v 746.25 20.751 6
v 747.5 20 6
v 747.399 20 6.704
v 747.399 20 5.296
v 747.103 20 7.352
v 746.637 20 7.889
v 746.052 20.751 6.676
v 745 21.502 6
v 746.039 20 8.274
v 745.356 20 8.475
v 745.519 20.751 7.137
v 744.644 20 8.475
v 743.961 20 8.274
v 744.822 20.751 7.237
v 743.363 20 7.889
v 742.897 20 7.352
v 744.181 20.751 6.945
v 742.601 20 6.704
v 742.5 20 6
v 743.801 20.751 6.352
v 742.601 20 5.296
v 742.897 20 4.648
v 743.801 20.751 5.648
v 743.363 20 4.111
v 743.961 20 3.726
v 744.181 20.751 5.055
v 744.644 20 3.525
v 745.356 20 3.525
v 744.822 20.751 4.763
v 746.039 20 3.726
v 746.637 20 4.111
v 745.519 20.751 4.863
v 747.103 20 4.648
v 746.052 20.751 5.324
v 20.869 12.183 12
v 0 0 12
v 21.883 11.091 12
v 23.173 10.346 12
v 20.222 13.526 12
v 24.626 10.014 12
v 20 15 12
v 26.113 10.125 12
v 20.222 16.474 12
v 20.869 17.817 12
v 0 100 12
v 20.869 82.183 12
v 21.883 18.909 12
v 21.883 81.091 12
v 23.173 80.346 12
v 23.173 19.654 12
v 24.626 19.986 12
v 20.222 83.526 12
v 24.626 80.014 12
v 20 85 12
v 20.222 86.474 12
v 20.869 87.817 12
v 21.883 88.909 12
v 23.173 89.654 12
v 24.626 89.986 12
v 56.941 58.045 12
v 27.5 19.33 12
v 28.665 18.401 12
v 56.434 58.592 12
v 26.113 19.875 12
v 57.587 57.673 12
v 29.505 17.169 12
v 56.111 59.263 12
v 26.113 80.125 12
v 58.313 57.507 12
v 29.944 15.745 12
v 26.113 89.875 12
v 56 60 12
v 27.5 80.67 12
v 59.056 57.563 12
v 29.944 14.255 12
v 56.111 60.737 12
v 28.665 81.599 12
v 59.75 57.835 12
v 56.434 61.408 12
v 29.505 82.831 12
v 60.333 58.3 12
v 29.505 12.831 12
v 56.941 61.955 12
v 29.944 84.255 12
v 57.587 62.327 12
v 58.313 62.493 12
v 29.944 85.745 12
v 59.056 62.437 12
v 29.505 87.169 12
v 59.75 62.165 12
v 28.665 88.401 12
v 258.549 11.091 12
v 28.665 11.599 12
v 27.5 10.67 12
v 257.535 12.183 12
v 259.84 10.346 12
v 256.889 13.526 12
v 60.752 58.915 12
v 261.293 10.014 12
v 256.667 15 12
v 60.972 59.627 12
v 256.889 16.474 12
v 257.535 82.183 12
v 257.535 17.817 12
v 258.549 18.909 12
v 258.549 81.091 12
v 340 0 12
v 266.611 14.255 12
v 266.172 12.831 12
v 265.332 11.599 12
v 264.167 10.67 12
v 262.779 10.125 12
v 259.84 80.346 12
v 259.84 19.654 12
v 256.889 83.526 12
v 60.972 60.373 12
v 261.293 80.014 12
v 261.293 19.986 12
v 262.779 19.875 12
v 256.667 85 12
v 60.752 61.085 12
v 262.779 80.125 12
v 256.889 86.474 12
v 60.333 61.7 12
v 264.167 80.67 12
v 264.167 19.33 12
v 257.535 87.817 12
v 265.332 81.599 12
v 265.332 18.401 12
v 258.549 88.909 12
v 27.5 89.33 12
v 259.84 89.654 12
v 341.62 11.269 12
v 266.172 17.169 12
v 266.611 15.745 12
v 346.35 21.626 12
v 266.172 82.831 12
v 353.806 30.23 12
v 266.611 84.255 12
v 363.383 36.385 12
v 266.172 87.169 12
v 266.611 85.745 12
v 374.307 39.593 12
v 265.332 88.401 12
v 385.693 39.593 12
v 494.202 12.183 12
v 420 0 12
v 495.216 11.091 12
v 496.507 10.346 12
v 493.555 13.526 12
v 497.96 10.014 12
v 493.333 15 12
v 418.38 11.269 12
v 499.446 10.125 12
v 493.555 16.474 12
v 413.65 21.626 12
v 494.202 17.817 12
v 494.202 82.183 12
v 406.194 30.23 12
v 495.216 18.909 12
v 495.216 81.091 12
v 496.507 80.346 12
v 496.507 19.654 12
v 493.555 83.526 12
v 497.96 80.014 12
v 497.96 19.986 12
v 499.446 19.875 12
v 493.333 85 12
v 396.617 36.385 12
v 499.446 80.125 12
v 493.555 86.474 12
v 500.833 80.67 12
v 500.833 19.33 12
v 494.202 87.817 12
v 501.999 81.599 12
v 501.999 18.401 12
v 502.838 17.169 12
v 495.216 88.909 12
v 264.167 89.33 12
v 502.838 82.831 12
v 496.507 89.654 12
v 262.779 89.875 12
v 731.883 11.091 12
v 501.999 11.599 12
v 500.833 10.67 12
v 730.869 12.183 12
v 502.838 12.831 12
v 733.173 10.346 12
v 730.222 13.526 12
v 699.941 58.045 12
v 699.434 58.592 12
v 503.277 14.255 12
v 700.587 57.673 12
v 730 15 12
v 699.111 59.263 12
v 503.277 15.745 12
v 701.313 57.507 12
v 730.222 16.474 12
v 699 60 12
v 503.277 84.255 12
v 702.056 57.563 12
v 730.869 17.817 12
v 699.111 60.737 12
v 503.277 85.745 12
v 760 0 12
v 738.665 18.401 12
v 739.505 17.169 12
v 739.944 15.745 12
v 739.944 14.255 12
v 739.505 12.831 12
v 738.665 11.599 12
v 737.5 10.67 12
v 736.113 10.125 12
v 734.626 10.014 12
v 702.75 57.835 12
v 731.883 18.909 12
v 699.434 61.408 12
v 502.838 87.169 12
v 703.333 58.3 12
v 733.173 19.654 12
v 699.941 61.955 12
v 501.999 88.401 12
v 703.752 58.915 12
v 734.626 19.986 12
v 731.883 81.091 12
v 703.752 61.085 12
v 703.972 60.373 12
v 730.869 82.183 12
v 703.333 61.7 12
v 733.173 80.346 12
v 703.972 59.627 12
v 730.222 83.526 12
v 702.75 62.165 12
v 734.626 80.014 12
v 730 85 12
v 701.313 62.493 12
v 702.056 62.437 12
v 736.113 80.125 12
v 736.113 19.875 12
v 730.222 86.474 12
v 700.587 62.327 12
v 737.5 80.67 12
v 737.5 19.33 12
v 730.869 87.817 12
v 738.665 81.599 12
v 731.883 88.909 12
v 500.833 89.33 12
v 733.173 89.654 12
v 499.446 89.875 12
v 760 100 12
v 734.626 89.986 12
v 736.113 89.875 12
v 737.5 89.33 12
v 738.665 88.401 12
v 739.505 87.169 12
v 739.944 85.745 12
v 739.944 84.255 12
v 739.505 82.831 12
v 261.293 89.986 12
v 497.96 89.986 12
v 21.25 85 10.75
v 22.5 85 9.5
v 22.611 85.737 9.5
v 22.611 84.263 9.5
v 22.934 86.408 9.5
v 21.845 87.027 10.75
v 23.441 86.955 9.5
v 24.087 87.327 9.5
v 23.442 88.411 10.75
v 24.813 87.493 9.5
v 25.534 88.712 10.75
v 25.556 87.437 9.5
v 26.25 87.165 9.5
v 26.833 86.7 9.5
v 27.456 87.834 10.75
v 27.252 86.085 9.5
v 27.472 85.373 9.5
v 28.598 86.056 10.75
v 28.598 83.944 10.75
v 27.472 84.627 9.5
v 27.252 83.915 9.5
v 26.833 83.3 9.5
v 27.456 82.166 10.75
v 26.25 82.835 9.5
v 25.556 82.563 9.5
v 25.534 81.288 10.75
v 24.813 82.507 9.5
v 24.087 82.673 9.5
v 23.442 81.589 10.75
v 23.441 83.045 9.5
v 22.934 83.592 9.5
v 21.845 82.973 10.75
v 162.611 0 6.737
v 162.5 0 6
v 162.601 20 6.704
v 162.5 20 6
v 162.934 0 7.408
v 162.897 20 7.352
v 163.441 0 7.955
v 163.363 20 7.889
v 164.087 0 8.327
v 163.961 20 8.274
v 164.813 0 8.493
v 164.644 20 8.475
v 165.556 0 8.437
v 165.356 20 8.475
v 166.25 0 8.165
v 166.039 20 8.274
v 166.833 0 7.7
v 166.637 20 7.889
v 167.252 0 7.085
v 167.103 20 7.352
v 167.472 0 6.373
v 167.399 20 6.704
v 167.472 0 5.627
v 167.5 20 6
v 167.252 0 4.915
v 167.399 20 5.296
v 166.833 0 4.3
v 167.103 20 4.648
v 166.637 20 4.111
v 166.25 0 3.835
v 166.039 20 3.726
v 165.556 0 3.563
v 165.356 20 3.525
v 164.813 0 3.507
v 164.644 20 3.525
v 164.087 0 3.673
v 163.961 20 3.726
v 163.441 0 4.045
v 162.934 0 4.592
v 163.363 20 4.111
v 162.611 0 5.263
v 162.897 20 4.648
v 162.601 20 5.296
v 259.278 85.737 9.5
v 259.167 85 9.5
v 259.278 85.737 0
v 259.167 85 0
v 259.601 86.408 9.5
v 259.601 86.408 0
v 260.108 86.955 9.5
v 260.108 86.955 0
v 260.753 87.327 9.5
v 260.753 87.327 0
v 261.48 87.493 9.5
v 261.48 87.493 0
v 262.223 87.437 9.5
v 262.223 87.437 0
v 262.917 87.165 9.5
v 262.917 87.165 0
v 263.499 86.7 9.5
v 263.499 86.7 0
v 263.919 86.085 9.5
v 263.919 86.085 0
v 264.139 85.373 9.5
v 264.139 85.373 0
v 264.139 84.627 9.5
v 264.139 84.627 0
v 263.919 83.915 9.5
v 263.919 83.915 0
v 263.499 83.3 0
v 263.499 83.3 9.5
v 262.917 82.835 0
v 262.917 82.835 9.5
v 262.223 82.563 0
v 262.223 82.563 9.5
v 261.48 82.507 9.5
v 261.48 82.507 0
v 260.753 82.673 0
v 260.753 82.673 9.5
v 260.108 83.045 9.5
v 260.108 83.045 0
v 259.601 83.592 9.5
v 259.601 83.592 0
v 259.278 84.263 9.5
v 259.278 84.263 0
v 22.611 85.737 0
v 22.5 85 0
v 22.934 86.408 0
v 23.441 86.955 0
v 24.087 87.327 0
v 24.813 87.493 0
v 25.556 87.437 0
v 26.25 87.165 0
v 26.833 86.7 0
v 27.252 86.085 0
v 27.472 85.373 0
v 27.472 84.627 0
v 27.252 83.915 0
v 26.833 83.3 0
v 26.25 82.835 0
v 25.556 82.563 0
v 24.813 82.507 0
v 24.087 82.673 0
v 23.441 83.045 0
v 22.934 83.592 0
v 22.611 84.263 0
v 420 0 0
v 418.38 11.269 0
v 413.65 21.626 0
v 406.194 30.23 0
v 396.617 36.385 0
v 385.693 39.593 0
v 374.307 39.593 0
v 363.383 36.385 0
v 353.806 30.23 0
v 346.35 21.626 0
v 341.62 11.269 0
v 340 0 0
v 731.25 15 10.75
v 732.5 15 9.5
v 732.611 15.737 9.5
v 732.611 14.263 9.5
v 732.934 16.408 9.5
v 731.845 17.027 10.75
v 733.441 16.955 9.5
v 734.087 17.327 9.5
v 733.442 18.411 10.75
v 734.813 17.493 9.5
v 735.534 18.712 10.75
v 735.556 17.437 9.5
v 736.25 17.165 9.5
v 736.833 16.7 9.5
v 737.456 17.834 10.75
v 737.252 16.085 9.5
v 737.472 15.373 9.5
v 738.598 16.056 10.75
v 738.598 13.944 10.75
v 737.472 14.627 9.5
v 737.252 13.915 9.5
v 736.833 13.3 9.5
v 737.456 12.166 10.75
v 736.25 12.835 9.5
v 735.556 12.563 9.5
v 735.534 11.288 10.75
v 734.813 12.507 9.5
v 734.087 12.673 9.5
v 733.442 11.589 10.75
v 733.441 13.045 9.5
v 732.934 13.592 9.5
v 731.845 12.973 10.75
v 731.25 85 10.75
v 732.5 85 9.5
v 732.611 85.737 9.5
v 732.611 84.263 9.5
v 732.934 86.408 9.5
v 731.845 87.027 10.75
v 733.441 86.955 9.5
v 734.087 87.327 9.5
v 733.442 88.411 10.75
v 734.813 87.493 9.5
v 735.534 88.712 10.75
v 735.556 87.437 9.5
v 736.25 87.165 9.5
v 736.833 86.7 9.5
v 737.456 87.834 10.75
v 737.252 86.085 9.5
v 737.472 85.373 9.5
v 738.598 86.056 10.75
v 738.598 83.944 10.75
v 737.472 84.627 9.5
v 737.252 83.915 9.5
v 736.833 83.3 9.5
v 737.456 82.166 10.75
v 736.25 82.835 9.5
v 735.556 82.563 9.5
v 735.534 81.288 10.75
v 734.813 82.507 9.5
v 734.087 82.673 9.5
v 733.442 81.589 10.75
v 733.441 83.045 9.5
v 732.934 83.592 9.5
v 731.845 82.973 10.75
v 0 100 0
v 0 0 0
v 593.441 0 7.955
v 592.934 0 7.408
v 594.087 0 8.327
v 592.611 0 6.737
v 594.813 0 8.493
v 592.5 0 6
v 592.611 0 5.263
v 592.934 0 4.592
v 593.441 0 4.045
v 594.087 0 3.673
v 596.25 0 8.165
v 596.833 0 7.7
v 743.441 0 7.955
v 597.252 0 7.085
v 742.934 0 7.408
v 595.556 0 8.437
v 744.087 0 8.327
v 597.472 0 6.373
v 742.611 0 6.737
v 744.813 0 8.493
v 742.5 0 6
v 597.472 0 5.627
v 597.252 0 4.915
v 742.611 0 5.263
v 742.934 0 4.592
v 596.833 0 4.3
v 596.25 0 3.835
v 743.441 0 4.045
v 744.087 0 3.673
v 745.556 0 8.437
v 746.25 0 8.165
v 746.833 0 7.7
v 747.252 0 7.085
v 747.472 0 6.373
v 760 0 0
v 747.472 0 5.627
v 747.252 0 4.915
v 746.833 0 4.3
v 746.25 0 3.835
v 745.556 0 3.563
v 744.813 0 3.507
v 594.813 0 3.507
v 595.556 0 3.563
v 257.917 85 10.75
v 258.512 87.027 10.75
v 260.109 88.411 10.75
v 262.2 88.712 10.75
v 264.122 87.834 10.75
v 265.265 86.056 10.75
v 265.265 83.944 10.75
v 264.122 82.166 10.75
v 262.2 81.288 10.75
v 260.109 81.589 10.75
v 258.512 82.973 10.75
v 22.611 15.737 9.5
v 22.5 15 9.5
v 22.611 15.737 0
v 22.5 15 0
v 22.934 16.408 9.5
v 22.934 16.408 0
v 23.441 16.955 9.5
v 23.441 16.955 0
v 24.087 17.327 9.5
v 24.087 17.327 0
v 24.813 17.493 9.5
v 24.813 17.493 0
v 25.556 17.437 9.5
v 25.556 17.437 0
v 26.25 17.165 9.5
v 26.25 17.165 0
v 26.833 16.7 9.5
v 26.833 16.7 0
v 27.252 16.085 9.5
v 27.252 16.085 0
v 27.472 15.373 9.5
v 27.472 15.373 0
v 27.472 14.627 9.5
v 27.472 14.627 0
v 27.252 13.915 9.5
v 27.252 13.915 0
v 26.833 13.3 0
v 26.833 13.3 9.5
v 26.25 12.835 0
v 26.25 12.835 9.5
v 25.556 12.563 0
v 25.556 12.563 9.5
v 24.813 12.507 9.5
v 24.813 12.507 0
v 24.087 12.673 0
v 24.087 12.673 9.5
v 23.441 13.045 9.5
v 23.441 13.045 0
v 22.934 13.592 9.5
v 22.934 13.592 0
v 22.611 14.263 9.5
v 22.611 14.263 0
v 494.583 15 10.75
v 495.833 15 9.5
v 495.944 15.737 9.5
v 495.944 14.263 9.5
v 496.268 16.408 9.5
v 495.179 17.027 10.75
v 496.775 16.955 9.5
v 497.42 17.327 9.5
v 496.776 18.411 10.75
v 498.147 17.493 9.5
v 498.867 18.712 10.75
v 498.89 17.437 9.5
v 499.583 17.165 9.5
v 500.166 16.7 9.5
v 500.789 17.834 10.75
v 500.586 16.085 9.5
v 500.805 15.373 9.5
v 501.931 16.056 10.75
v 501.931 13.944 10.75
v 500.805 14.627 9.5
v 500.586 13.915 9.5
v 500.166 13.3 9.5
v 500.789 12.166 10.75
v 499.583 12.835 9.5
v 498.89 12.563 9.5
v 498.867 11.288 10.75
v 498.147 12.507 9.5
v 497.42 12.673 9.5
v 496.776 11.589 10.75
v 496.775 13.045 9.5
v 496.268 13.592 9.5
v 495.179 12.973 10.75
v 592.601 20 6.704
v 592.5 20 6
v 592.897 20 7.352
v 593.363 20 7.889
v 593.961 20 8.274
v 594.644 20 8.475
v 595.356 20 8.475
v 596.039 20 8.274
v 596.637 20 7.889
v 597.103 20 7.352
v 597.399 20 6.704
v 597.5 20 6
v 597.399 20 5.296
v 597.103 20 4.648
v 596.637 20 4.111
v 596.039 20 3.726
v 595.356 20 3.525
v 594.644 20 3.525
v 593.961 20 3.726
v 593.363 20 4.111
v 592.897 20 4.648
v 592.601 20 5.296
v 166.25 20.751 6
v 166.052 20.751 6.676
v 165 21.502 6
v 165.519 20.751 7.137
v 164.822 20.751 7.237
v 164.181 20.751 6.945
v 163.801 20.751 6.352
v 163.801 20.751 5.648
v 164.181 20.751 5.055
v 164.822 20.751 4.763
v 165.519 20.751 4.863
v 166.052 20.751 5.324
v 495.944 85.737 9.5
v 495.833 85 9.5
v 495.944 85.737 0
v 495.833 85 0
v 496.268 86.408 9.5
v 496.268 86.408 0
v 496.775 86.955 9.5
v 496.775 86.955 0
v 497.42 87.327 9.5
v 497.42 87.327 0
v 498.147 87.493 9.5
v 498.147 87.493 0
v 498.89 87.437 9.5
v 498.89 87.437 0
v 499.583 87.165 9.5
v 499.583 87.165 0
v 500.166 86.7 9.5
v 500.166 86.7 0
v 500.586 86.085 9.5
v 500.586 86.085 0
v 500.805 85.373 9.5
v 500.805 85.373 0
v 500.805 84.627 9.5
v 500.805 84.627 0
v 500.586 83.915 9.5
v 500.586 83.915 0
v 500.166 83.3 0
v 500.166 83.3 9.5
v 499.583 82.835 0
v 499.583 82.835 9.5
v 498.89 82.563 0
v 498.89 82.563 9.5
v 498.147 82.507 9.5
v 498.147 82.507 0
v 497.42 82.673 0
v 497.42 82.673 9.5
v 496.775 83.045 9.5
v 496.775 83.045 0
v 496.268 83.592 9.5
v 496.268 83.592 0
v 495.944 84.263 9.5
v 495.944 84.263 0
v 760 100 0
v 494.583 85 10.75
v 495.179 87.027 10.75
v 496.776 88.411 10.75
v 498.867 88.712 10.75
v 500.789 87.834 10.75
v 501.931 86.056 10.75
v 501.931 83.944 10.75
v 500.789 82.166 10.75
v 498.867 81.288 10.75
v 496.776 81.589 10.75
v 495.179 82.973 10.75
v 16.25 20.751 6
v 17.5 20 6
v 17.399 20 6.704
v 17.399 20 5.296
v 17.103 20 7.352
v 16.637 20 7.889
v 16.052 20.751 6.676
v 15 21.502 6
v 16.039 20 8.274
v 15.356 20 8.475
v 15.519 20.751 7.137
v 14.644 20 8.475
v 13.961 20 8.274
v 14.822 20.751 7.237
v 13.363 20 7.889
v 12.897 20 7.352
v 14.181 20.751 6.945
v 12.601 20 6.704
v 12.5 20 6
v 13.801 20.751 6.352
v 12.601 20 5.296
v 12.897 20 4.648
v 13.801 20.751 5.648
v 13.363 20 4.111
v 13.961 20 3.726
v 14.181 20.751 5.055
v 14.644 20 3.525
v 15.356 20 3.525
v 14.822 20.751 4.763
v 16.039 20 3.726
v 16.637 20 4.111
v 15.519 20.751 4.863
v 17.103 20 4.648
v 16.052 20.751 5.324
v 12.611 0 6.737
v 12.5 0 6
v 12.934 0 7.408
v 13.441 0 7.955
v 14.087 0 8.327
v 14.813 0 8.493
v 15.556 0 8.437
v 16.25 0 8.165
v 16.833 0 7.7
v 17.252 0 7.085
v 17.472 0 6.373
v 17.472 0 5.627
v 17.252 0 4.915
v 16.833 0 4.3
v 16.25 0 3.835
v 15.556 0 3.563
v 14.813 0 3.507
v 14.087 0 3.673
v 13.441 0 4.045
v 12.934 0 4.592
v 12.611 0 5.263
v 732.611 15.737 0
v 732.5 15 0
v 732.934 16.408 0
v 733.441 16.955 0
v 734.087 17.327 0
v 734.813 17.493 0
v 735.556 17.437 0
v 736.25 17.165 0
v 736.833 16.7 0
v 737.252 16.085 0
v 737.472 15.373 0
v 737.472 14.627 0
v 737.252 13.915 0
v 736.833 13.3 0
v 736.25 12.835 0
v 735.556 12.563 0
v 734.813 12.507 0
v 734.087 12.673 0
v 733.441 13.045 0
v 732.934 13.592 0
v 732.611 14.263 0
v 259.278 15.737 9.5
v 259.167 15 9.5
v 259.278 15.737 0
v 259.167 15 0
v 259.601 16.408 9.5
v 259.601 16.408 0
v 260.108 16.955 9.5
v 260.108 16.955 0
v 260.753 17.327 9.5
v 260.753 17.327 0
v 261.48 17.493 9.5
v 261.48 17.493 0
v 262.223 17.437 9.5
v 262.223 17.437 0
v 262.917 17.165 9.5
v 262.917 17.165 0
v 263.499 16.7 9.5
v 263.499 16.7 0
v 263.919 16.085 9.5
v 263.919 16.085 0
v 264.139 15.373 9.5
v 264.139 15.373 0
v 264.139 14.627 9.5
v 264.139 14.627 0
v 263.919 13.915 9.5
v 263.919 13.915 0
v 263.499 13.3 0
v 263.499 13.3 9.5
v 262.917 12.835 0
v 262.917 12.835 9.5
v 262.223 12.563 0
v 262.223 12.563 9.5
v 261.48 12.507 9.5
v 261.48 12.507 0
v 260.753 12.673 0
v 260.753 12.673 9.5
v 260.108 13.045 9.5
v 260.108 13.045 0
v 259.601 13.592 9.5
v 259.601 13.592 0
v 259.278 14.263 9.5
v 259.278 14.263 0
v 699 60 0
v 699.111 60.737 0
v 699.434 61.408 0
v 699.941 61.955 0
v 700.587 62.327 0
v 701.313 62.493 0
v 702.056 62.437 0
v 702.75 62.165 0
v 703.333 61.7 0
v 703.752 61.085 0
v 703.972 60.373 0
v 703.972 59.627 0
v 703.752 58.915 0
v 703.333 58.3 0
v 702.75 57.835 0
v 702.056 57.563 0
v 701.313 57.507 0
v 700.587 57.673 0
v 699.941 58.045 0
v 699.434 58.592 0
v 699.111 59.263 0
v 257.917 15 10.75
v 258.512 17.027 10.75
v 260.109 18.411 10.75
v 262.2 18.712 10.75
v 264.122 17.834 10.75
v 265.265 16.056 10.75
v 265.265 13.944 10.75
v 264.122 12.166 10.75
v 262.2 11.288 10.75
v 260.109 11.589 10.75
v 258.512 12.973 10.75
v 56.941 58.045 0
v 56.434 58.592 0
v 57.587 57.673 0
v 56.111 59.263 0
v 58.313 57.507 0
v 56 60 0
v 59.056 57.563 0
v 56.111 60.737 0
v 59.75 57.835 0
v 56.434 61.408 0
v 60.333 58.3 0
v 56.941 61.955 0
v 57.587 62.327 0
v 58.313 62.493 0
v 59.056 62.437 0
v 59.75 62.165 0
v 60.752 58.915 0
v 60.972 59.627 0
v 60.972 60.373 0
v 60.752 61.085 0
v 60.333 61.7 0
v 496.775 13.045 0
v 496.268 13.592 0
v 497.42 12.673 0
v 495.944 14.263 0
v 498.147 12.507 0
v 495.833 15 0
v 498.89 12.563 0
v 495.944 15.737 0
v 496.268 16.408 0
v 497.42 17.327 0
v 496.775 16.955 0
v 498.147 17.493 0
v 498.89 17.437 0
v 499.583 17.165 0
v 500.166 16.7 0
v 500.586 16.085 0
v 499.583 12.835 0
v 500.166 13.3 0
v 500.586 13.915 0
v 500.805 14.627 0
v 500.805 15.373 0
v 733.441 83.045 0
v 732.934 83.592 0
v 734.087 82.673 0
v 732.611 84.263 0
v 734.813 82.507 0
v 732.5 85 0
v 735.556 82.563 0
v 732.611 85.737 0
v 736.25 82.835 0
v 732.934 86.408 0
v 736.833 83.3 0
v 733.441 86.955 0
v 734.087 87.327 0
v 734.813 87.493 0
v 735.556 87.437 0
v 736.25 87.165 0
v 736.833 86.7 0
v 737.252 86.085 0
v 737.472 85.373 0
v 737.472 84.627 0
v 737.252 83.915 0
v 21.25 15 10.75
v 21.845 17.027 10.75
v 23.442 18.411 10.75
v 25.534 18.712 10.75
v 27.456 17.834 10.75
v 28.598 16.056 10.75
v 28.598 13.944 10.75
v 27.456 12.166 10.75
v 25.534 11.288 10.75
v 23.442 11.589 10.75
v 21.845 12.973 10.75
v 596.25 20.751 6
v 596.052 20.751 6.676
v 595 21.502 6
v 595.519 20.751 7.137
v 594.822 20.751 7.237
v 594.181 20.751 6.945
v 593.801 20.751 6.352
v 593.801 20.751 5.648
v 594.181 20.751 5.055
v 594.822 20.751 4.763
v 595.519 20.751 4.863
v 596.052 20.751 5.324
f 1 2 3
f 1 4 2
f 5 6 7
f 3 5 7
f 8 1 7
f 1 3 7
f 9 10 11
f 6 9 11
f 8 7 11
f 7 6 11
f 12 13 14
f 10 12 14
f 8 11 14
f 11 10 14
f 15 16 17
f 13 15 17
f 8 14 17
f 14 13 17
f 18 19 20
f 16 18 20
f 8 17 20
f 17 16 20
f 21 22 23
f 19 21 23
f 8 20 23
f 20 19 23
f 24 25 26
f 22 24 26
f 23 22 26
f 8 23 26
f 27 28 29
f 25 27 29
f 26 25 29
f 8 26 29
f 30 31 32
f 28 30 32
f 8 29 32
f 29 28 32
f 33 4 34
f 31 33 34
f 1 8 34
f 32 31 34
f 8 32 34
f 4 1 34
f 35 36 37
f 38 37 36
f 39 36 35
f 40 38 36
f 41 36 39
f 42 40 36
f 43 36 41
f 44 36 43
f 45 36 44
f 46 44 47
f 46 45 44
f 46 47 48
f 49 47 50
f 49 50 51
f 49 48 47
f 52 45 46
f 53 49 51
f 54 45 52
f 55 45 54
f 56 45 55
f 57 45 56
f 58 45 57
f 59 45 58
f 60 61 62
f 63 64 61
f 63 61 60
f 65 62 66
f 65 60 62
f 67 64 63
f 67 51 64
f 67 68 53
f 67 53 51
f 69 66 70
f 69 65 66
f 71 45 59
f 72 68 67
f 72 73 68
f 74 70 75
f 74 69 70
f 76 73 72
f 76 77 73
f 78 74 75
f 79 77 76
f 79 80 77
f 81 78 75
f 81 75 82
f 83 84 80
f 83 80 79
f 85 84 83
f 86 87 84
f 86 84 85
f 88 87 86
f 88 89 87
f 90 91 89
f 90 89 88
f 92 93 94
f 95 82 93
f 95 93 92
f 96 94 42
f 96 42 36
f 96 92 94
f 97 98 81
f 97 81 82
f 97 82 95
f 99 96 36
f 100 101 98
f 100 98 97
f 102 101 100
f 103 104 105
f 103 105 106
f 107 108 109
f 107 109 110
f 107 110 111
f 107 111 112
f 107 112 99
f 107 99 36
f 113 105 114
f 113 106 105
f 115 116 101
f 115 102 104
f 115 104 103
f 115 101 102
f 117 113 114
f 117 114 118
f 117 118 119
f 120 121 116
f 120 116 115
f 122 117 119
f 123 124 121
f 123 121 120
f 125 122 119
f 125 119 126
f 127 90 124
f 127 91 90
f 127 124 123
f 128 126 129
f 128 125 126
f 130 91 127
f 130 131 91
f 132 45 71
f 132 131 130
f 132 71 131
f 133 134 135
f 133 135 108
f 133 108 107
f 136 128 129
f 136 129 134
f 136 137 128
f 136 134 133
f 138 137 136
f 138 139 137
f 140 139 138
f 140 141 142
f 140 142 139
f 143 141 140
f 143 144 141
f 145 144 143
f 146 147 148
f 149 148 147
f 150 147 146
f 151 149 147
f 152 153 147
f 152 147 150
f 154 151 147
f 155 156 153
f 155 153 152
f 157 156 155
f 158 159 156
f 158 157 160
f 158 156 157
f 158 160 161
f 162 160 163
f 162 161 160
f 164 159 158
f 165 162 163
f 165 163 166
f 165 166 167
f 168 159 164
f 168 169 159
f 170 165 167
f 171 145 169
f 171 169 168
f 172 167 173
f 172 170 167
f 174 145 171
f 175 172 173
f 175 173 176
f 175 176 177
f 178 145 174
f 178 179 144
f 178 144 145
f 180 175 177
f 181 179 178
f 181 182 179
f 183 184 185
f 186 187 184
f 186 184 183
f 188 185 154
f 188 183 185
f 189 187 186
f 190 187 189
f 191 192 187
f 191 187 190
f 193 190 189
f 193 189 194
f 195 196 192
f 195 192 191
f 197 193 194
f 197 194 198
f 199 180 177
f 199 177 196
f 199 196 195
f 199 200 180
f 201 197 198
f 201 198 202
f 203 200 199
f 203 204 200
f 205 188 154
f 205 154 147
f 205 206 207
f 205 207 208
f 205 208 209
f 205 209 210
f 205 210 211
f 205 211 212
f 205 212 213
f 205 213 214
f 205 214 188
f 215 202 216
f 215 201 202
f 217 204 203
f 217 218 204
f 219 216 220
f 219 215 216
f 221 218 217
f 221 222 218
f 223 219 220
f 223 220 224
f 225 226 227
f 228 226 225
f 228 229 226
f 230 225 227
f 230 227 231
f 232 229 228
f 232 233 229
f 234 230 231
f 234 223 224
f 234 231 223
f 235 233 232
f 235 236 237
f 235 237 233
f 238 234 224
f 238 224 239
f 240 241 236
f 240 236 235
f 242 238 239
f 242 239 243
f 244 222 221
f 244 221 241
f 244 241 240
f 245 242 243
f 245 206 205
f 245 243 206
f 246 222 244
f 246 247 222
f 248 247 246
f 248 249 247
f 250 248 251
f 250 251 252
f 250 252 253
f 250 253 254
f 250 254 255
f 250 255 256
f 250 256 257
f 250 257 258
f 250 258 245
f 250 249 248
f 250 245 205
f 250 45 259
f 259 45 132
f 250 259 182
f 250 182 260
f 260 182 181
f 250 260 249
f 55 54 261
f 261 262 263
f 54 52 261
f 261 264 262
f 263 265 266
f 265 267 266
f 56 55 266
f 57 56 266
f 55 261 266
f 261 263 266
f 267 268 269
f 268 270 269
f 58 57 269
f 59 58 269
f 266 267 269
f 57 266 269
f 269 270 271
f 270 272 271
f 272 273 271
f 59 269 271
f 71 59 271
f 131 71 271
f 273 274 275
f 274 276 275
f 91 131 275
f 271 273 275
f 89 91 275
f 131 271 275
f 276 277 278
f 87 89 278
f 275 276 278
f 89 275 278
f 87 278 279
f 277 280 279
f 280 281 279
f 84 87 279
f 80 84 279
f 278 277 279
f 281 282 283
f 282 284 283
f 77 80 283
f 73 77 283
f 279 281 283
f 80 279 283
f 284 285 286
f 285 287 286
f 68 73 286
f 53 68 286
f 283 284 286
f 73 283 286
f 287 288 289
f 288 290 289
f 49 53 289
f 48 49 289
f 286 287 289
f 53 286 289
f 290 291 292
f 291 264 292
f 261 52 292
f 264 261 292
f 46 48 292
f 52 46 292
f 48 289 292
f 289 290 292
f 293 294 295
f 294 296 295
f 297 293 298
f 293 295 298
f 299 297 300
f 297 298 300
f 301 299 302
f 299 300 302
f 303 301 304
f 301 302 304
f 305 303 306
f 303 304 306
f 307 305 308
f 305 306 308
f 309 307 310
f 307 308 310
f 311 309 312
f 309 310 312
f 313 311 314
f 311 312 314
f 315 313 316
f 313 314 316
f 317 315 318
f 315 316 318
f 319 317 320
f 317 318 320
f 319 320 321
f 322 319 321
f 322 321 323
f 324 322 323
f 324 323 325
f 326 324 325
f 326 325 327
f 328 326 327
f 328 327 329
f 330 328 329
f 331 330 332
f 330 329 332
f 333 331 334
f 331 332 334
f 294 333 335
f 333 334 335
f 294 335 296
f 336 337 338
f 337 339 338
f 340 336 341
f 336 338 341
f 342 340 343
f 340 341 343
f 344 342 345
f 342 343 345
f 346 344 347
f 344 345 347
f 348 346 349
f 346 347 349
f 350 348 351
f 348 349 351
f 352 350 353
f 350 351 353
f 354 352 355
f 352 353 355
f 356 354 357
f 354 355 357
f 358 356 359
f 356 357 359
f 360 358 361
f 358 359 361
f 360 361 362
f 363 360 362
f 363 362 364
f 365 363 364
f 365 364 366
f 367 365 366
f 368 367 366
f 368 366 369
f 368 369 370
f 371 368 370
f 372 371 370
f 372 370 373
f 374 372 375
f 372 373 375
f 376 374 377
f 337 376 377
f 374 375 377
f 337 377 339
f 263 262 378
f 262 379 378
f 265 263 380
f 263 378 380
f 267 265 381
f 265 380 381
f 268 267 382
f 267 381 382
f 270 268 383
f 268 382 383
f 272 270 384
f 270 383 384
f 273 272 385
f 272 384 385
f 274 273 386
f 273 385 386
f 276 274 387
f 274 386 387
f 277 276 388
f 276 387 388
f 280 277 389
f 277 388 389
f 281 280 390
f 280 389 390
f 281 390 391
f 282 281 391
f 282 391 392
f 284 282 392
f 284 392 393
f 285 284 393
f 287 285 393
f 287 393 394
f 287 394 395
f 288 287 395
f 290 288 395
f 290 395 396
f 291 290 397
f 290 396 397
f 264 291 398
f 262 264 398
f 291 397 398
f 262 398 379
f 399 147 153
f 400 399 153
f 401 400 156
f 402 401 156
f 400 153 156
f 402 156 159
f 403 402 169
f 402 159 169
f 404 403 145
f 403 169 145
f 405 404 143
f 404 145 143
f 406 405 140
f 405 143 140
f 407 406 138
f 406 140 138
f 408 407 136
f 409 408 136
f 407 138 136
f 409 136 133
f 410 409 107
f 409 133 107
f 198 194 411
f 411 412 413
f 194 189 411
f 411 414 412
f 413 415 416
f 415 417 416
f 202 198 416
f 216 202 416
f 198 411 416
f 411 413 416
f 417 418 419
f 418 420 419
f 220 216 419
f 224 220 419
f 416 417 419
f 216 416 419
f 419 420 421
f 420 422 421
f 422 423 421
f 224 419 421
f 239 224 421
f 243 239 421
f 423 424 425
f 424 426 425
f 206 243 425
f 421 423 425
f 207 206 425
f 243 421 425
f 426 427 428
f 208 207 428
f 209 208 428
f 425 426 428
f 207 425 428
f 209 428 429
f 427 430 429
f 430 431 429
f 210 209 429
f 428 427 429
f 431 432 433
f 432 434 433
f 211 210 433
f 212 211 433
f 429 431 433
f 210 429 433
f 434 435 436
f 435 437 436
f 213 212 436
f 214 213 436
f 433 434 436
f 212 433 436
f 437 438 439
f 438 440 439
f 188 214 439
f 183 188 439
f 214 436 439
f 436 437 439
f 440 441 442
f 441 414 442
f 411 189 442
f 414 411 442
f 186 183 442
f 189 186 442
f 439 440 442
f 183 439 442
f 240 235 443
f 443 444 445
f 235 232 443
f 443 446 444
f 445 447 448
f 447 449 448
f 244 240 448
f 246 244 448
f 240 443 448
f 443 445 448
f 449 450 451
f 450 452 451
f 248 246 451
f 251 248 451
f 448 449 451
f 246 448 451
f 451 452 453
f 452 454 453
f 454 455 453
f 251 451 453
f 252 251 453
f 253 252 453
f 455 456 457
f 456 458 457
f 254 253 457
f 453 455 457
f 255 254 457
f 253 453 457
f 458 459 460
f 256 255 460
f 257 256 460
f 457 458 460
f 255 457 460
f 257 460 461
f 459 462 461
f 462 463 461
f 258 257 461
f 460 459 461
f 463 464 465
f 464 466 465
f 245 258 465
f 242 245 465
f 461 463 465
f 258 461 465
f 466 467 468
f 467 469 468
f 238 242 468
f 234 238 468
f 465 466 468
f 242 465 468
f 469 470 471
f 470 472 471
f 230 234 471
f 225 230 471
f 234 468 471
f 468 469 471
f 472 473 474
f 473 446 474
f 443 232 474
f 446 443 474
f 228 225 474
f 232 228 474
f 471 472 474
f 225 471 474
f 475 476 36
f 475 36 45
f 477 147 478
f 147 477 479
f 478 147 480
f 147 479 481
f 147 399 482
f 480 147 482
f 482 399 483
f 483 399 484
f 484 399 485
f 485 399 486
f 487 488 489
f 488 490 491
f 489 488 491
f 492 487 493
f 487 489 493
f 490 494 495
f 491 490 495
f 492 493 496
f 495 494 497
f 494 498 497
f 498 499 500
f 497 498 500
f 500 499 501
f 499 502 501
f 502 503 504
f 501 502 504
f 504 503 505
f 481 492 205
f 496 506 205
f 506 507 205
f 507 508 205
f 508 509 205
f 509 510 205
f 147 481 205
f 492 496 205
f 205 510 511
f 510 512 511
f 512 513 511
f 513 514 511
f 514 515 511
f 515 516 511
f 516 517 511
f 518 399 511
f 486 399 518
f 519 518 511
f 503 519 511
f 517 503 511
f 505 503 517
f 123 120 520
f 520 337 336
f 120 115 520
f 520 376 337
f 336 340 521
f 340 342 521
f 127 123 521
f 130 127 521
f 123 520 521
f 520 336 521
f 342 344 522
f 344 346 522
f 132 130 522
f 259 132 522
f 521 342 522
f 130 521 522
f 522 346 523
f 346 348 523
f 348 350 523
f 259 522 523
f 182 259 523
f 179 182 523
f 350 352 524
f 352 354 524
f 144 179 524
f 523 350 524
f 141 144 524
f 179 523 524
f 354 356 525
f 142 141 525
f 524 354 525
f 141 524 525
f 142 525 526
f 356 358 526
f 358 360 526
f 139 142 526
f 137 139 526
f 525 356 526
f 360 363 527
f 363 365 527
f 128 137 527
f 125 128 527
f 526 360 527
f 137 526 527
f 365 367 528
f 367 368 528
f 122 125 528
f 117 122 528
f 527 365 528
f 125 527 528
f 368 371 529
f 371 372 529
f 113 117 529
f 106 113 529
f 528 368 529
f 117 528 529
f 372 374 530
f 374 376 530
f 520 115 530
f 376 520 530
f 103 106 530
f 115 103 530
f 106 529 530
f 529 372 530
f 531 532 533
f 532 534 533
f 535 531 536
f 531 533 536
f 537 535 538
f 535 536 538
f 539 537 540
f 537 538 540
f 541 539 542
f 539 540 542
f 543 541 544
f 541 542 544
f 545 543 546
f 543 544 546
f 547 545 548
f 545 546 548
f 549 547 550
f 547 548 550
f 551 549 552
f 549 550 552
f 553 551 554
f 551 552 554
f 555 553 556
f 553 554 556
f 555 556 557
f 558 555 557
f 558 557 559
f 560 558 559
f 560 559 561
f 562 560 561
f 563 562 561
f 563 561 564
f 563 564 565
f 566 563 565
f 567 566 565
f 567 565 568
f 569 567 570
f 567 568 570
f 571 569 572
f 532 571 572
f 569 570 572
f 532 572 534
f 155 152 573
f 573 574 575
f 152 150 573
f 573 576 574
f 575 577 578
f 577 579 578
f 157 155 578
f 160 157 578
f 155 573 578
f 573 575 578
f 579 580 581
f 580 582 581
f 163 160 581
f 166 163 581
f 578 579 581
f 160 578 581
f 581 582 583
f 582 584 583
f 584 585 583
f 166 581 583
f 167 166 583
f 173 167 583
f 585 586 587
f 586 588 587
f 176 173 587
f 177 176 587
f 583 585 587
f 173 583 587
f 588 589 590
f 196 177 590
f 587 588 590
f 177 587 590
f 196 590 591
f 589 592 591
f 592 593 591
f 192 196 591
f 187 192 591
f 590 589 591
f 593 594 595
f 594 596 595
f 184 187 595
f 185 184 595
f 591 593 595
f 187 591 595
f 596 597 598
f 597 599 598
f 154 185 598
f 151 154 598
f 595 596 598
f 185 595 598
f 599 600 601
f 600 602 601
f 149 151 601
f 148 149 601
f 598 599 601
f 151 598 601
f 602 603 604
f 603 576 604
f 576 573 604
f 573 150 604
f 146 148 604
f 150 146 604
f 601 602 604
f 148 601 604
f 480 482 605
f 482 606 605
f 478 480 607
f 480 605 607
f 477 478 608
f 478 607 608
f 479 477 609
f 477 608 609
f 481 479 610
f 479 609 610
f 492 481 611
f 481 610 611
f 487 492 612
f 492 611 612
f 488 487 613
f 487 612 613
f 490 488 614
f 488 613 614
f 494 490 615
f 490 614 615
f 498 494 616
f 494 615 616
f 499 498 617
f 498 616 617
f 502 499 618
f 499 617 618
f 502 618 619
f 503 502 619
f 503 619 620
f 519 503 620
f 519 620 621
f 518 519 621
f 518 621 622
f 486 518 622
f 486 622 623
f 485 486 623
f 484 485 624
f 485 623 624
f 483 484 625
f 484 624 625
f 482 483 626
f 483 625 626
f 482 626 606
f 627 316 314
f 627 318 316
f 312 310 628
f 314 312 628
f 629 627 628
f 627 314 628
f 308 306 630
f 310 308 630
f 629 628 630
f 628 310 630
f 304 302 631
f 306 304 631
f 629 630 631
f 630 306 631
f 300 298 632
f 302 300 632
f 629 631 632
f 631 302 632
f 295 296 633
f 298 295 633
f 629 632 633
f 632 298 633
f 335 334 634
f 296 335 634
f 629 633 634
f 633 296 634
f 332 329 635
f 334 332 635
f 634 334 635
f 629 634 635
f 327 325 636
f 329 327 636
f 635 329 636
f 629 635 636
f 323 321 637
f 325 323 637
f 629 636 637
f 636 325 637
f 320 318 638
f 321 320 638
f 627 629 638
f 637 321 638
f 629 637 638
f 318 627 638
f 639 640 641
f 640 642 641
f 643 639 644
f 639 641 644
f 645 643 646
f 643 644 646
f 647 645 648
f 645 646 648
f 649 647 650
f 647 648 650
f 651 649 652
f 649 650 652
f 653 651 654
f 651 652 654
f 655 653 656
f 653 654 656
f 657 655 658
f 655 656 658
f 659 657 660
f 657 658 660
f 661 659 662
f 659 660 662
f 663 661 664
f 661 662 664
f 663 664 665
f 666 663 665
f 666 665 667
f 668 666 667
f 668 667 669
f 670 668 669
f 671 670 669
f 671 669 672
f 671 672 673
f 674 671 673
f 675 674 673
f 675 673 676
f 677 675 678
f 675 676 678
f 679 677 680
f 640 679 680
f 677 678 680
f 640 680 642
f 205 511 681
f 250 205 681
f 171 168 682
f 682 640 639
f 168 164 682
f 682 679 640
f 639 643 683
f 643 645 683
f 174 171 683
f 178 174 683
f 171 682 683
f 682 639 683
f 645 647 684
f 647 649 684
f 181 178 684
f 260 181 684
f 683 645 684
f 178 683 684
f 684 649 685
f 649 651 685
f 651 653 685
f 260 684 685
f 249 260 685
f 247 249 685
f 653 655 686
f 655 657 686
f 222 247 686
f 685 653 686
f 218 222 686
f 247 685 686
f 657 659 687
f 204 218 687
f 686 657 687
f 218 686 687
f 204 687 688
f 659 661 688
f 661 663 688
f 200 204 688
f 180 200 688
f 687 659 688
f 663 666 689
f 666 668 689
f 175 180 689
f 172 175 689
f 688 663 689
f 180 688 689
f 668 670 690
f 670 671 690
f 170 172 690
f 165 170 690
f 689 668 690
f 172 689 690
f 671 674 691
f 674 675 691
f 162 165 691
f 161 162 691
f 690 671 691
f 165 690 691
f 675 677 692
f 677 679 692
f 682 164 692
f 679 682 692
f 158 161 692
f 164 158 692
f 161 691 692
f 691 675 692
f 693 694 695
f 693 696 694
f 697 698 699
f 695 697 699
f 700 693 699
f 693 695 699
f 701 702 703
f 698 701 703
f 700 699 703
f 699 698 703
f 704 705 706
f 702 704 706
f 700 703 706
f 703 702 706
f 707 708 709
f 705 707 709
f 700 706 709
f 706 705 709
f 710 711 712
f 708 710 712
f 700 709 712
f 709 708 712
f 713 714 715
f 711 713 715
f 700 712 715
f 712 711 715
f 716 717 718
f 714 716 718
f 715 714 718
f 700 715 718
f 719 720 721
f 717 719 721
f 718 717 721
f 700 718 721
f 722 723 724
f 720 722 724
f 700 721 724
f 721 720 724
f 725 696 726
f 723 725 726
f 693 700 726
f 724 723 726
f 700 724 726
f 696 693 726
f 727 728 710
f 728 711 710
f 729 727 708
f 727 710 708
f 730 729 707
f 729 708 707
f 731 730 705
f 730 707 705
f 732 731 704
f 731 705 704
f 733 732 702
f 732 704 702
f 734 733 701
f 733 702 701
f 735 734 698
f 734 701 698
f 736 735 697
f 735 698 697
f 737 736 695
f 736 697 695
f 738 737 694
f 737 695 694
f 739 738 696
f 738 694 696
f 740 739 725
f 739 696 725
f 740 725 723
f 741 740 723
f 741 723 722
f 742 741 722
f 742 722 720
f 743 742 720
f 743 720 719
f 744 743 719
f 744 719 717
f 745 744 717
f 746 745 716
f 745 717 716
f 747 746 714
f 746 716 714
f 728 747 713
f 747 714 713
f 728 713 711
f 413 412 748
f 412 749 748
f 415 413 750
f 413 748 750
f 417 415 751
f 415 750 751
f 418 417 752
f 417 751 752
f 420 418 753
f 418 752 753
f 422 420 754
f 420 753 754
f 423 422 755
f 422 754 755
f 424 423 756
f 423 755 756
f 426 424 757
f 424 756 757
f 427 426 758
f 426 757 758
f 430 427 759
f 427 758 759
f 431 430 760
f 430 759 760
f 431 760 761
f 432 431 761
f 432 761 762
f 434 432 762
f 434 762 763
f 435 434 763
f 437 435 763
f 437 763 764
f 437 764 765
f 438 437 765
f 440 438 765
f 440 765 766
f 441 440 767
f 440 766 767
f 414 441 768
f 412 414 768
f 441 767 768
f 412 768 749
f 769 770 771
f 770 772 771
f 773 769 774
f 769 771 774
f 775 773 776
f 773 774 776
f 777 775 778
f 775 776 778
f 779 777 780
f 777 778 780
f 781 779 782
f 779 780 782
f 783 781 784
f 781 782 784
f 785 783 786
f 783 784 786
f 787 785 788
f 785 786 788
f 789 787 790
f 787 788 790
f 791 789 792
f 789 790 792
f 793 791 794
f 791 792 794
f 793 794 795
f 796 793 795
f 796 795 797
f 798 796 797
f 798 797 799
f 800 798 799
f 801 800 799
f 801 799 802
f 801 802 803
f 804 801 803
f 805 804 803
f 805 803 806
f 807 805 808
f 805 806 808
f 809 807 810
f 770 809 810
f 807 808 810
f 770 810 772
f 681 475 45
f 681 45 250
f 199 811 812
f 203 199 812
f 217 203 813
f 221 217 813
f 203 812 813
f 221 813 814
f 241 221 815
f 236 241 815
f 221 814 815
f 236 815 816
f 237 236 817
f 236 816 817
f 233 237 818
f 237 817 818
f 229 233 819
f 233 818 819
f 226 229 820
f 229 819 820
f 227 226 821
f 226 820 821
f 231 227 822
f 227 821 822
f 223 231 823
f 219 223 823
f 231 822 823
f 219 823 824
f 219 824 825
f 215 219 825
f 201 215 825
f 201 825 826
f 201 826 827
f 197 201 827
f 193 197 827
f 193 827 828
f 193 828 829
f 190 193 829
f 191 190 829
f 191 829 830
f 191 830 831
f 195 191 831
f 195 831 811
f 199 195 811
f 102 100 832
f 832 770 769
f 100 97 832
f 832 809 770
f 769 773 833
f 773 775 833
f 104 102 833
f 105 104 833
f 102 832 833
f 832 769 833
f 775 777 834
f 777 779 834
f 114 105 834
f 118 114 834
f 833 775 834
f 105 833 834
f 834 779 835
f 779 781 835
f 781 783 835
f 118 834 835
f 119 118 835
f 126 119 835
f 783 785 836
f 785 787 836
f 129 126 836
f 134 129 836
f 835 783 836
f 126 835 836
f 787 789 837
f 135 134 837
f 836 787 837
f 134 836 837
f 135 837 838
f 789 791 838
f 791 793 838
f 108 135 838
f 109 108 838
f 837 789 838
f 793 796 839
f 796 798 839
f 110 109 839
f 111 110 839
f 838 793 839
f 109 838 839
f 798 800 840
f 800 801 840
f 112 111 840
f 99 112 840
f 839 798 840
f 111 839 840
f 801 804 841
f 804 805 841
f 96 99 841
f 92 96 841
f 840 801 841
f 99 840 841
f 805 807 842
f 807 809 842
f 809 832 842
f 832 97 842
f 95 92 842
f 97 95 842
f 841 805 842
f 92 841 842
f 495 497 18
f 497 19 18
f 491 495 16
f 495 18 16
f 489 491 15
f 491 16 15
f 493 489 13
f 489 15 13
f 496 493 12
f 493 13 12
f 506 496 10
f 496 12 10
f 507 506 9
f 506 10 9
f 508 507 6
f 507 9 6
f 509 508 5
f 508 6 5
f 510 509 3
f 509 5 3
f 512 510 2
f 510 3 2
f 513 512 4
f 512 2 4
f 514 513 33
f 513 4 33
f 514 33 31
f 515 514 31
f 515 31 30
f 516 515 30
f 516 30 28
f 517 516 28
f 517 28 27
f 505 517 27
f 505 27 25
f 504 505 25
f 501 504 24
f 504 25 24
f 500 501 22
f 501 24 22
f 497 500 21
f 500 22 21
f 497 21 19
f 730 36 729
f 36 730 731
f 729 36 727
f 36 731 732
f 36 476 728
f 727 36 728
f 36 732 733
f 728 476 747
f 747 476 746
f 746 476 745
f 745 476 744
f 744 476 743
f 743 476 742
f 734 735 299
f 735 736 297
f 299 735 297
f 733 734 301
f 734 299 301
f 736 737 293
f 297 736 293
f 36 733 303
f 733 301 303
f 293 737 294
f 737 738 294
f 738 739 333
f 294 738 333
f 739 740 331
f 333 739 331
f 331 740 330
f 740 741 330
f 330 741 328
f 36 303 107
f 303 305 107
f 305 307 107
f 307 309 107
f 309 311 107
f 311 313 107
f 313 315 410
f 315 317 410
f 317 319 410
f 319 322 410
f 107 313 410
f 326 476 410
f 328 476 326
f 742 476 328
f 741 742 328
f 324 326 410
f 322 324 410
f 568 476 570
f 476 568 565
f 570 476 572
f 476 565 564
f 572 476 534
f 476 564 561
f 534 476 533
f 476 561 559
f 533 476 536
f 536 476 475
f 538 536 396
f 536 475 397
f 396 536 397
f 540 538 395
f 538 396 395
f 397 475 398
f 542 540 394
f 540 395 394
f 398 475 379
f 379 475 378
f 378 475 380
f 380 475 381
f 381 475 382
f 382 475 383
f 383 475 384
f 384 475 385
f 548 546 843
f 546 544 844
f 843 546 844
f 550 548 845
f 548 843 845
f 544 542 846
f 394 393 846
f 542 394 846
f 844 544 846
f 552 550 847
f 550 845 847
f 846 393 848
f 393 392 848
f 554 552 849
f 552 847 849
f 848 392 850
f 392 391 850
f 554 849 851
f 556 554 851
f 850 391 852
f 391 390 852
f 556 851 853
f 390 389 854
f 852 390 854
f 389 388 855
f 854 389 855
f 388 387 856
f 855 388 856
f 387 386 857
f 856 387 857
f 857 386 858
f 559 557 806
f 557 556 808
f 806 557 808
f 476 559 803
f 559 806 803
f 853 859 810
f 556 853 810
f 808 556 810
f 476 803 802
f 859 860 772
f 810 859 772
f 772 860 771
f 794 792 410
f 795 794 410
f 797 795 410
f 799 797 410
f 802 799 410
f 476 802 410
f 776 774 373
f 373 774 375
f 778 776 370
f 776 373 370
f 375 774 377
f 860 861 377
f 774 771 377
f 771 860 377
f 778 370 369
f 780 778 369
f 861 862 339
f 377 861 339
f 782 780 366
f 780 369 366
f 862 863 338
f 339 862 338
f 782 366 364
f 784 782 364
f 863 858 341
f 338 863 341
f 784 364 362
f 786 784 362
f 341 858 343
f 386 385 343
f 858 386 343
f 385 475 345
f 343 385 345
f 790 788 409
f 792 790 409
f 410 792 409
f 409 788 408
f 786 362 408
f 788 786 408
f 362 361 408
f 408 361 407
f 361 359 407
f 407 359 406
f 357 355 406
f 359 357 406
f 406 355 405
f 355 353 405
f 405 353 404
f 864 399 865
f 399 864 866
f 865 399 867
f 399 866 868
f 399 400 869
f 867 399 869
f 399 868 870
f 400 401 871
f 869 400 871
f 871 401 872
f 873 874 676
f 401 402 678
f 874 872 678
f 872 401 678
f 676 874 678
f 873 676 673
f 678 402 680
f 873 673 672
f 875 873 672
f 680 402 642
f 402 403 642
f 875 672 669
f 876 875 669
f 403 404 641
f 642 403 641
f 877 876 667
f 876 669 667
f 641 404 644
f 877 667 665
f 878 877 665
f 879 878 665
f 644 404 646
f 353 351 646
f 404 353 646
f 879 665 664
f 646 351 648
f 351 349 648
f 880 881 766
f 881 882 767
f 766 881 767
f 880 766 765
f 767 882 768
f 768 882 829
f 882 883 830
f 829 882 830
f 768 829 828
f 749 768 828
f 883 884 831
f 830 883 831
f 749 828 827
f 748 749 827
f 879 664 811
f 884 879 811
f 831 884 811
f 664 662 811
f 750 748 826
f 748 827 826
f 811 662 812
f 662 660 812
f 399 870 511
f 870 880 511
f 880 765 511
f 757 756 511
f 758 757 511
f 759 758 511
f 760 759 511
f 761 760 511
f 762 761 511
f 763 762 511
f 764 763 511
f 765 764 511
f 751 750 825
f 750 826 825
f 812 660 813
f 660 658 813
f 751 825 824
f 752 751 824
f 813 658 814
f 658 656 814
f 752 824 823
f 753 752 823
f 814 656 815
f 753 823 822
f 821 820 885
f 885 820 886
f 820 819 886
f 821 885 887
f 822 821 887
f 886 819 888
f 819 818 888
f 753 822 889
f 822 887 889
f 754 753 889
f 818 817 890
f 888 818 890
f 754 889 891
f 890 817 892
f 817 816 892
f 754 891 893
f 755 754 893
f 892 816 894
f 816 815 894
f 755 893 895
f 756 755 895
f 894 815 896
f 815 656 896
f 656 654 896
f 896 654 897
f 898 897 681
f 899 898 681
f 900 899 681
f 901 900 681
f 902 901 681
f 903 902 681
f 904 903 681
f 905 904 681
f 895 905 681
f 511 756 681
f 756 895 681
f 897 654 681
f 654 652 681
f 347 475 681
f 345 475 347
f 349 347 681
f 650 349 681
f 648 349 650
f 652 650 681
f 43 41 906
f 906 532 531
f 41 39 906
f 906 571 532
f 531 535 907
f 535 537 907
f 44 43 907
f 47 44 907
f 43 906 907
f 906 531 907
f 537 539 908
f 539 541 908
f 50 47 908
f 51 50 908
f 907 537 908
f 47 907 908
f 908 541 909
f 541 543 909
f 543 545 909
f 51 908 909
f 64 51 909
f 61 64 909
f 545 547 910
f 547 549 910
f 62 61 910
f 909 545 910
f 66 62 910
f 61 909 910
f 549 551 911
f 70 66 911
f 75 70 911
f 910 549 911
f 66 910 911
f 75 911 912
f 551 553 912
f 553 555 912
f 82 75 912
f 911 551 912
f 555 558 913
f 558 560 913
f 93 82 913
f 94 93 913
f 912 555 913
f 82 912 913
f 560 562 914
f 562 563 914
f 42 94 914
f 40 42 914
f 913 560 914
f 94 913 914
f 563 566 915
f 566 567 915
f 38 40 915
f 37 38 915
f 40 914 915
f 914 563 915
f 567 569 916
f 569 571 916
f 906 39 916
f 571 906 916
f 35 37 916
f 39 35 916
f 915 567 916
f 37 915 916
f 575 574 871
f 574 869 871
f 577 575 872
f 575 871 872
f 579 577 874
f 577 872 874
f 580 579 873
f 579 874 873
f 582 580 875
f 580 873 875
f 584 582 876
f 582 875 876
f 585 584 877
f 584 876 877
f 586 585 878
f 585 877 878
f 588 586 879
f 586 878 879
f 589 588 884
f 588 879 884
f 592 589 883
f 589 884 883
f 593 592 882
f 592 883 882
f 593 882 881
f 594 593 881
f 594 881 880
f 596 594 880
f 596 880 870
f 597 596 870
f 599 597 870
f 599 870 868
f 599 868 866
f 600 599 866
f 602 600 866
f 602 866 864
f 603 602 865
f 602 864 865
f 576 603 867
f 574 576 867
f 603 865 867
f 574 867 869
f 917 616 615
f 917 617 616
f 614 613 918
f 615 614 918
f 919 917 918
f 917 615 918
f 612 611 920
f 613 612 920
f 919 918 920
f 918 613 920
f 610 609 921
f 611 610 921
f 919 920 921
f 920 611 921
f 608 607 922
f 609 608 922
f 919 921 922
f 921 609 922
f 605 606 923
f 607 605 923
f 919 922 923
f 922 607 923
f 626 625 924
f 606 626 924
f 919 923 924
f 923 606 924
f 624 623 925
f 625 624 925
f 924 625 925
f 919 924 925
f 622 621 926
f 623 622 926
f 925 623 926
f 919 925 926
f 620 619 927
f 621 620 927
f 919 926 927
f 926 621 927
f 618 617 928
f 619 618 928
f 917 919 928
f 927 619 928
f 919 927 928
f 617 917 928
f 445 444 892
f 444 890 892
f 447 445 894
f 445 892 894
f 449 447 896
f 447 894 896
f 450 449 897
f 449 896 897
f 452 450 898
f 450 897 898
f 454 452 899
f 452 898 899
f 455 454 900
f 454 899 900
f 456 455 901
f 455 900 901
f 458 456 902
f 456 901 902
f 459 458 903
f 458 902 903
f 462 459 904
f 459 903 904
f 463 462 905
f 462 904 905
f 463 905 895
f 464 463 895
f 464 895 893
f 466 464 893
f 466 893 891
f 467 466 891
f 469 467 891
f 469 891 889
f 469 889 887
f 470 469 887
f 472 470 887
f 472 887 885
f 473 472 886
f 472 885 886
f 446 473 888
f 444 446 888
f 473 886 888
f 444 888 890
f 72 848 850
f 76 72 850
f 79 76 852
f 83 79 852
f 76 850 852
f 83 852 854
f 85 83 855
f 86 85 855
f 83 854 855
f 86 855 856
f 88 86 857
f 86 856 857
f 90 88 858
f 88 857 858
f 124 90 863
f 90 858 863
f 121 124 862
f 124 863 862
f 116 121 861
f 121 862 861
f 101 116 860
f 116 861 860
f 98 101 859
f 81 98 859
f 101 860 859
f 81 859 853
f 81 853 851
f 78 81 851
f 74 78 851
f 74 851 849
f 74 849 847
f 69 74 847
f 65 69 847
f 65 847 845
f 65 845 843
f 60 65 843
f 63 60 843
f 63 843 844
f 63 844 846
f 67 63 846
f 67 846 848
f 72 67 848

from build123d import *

# Parameters (mm, degrees)
F0_W            = 760
F0_H            = 100
F1_DEPTH        = 12
F3_D            = 5
F4_R            = 40
F5_DEPTH        = 25
F8_D            = 5
F8_DEPTH        = 20
F8_TIP          = 1.5021515476
F8_ON_F7_D      = 5
F8_ON_F7_DEPTH  = 20
F8_ON_F7_TIP    = 1.5021515476
F10_D           = 5
F10_CSINK_D     = 10
F10_CSINK_ANGLE = 90


with BuildPart() as f1:
    # F0 (on Top) → F1 (new body)
    with BuildSketch(Plane.XY):
        with Locations((380, 50)):
            Rectangle(F0_W, F0_H)
    extrude(amount=F1_DEPTH)

    # F3 (through all)
    with Locations(Plane.XY.offset(12)):
        with Locations((58.5, 60), (701.5, 60)):
            Hole(F3_D / 2)

    # F4 (on face) → F5 (cut)
    with BuildSketch(Plane.XY.offset(12)):
        with Locations((380, 0)):
            Circle(F4_R)
    extrude(amount=-F5_DEPTH, mode=Mode.SUBTRACT)

    # F8
    with Locations(Plane.XZ):
        with Locations((15, 6), (165, 6)):
            Hole(F8_D / 2, depth=F8_DEPTH)
            with Locations((0, 0, -(F8_DEPTH + F8_TIP / 2))):  # 118° drill point
                Cone(0, F8_D / 2, F8_TIP, mode=Mode.SUBTRACT)

    # F8 on F7
    with Locations(Plane.XZ):
        with Locations((595, 6), (745, 6)):
            Hole(F8_ON_F7_D / 2, depth=F8_ON_F7_DEPTH)
            with Locations((0, 0, -(F8_ON_F7_DEPTH + F8_ON_F7_TIP / 2))):  # 118° drill point
                Cone(0, F8_ON_F7_D / 2, F8_ON_F7_TIP, mode=Mode.SUBTRACT)

    # F10 (through all)
    with Locations(Plane.XY.offset(12)):
        with Locations((25, 15), (25, 85), (261.6666666667, 15), (261.6666666667, 85), (498.3333333333, 15), (498.3333333333, 85), (735, 85), (735, 15)):
            CounterSinkHole(F10_D / 2, F10_CSINK_D / 2, counter_sink_angle=F10_CSINK_ANGLE)


solid = f1.part
